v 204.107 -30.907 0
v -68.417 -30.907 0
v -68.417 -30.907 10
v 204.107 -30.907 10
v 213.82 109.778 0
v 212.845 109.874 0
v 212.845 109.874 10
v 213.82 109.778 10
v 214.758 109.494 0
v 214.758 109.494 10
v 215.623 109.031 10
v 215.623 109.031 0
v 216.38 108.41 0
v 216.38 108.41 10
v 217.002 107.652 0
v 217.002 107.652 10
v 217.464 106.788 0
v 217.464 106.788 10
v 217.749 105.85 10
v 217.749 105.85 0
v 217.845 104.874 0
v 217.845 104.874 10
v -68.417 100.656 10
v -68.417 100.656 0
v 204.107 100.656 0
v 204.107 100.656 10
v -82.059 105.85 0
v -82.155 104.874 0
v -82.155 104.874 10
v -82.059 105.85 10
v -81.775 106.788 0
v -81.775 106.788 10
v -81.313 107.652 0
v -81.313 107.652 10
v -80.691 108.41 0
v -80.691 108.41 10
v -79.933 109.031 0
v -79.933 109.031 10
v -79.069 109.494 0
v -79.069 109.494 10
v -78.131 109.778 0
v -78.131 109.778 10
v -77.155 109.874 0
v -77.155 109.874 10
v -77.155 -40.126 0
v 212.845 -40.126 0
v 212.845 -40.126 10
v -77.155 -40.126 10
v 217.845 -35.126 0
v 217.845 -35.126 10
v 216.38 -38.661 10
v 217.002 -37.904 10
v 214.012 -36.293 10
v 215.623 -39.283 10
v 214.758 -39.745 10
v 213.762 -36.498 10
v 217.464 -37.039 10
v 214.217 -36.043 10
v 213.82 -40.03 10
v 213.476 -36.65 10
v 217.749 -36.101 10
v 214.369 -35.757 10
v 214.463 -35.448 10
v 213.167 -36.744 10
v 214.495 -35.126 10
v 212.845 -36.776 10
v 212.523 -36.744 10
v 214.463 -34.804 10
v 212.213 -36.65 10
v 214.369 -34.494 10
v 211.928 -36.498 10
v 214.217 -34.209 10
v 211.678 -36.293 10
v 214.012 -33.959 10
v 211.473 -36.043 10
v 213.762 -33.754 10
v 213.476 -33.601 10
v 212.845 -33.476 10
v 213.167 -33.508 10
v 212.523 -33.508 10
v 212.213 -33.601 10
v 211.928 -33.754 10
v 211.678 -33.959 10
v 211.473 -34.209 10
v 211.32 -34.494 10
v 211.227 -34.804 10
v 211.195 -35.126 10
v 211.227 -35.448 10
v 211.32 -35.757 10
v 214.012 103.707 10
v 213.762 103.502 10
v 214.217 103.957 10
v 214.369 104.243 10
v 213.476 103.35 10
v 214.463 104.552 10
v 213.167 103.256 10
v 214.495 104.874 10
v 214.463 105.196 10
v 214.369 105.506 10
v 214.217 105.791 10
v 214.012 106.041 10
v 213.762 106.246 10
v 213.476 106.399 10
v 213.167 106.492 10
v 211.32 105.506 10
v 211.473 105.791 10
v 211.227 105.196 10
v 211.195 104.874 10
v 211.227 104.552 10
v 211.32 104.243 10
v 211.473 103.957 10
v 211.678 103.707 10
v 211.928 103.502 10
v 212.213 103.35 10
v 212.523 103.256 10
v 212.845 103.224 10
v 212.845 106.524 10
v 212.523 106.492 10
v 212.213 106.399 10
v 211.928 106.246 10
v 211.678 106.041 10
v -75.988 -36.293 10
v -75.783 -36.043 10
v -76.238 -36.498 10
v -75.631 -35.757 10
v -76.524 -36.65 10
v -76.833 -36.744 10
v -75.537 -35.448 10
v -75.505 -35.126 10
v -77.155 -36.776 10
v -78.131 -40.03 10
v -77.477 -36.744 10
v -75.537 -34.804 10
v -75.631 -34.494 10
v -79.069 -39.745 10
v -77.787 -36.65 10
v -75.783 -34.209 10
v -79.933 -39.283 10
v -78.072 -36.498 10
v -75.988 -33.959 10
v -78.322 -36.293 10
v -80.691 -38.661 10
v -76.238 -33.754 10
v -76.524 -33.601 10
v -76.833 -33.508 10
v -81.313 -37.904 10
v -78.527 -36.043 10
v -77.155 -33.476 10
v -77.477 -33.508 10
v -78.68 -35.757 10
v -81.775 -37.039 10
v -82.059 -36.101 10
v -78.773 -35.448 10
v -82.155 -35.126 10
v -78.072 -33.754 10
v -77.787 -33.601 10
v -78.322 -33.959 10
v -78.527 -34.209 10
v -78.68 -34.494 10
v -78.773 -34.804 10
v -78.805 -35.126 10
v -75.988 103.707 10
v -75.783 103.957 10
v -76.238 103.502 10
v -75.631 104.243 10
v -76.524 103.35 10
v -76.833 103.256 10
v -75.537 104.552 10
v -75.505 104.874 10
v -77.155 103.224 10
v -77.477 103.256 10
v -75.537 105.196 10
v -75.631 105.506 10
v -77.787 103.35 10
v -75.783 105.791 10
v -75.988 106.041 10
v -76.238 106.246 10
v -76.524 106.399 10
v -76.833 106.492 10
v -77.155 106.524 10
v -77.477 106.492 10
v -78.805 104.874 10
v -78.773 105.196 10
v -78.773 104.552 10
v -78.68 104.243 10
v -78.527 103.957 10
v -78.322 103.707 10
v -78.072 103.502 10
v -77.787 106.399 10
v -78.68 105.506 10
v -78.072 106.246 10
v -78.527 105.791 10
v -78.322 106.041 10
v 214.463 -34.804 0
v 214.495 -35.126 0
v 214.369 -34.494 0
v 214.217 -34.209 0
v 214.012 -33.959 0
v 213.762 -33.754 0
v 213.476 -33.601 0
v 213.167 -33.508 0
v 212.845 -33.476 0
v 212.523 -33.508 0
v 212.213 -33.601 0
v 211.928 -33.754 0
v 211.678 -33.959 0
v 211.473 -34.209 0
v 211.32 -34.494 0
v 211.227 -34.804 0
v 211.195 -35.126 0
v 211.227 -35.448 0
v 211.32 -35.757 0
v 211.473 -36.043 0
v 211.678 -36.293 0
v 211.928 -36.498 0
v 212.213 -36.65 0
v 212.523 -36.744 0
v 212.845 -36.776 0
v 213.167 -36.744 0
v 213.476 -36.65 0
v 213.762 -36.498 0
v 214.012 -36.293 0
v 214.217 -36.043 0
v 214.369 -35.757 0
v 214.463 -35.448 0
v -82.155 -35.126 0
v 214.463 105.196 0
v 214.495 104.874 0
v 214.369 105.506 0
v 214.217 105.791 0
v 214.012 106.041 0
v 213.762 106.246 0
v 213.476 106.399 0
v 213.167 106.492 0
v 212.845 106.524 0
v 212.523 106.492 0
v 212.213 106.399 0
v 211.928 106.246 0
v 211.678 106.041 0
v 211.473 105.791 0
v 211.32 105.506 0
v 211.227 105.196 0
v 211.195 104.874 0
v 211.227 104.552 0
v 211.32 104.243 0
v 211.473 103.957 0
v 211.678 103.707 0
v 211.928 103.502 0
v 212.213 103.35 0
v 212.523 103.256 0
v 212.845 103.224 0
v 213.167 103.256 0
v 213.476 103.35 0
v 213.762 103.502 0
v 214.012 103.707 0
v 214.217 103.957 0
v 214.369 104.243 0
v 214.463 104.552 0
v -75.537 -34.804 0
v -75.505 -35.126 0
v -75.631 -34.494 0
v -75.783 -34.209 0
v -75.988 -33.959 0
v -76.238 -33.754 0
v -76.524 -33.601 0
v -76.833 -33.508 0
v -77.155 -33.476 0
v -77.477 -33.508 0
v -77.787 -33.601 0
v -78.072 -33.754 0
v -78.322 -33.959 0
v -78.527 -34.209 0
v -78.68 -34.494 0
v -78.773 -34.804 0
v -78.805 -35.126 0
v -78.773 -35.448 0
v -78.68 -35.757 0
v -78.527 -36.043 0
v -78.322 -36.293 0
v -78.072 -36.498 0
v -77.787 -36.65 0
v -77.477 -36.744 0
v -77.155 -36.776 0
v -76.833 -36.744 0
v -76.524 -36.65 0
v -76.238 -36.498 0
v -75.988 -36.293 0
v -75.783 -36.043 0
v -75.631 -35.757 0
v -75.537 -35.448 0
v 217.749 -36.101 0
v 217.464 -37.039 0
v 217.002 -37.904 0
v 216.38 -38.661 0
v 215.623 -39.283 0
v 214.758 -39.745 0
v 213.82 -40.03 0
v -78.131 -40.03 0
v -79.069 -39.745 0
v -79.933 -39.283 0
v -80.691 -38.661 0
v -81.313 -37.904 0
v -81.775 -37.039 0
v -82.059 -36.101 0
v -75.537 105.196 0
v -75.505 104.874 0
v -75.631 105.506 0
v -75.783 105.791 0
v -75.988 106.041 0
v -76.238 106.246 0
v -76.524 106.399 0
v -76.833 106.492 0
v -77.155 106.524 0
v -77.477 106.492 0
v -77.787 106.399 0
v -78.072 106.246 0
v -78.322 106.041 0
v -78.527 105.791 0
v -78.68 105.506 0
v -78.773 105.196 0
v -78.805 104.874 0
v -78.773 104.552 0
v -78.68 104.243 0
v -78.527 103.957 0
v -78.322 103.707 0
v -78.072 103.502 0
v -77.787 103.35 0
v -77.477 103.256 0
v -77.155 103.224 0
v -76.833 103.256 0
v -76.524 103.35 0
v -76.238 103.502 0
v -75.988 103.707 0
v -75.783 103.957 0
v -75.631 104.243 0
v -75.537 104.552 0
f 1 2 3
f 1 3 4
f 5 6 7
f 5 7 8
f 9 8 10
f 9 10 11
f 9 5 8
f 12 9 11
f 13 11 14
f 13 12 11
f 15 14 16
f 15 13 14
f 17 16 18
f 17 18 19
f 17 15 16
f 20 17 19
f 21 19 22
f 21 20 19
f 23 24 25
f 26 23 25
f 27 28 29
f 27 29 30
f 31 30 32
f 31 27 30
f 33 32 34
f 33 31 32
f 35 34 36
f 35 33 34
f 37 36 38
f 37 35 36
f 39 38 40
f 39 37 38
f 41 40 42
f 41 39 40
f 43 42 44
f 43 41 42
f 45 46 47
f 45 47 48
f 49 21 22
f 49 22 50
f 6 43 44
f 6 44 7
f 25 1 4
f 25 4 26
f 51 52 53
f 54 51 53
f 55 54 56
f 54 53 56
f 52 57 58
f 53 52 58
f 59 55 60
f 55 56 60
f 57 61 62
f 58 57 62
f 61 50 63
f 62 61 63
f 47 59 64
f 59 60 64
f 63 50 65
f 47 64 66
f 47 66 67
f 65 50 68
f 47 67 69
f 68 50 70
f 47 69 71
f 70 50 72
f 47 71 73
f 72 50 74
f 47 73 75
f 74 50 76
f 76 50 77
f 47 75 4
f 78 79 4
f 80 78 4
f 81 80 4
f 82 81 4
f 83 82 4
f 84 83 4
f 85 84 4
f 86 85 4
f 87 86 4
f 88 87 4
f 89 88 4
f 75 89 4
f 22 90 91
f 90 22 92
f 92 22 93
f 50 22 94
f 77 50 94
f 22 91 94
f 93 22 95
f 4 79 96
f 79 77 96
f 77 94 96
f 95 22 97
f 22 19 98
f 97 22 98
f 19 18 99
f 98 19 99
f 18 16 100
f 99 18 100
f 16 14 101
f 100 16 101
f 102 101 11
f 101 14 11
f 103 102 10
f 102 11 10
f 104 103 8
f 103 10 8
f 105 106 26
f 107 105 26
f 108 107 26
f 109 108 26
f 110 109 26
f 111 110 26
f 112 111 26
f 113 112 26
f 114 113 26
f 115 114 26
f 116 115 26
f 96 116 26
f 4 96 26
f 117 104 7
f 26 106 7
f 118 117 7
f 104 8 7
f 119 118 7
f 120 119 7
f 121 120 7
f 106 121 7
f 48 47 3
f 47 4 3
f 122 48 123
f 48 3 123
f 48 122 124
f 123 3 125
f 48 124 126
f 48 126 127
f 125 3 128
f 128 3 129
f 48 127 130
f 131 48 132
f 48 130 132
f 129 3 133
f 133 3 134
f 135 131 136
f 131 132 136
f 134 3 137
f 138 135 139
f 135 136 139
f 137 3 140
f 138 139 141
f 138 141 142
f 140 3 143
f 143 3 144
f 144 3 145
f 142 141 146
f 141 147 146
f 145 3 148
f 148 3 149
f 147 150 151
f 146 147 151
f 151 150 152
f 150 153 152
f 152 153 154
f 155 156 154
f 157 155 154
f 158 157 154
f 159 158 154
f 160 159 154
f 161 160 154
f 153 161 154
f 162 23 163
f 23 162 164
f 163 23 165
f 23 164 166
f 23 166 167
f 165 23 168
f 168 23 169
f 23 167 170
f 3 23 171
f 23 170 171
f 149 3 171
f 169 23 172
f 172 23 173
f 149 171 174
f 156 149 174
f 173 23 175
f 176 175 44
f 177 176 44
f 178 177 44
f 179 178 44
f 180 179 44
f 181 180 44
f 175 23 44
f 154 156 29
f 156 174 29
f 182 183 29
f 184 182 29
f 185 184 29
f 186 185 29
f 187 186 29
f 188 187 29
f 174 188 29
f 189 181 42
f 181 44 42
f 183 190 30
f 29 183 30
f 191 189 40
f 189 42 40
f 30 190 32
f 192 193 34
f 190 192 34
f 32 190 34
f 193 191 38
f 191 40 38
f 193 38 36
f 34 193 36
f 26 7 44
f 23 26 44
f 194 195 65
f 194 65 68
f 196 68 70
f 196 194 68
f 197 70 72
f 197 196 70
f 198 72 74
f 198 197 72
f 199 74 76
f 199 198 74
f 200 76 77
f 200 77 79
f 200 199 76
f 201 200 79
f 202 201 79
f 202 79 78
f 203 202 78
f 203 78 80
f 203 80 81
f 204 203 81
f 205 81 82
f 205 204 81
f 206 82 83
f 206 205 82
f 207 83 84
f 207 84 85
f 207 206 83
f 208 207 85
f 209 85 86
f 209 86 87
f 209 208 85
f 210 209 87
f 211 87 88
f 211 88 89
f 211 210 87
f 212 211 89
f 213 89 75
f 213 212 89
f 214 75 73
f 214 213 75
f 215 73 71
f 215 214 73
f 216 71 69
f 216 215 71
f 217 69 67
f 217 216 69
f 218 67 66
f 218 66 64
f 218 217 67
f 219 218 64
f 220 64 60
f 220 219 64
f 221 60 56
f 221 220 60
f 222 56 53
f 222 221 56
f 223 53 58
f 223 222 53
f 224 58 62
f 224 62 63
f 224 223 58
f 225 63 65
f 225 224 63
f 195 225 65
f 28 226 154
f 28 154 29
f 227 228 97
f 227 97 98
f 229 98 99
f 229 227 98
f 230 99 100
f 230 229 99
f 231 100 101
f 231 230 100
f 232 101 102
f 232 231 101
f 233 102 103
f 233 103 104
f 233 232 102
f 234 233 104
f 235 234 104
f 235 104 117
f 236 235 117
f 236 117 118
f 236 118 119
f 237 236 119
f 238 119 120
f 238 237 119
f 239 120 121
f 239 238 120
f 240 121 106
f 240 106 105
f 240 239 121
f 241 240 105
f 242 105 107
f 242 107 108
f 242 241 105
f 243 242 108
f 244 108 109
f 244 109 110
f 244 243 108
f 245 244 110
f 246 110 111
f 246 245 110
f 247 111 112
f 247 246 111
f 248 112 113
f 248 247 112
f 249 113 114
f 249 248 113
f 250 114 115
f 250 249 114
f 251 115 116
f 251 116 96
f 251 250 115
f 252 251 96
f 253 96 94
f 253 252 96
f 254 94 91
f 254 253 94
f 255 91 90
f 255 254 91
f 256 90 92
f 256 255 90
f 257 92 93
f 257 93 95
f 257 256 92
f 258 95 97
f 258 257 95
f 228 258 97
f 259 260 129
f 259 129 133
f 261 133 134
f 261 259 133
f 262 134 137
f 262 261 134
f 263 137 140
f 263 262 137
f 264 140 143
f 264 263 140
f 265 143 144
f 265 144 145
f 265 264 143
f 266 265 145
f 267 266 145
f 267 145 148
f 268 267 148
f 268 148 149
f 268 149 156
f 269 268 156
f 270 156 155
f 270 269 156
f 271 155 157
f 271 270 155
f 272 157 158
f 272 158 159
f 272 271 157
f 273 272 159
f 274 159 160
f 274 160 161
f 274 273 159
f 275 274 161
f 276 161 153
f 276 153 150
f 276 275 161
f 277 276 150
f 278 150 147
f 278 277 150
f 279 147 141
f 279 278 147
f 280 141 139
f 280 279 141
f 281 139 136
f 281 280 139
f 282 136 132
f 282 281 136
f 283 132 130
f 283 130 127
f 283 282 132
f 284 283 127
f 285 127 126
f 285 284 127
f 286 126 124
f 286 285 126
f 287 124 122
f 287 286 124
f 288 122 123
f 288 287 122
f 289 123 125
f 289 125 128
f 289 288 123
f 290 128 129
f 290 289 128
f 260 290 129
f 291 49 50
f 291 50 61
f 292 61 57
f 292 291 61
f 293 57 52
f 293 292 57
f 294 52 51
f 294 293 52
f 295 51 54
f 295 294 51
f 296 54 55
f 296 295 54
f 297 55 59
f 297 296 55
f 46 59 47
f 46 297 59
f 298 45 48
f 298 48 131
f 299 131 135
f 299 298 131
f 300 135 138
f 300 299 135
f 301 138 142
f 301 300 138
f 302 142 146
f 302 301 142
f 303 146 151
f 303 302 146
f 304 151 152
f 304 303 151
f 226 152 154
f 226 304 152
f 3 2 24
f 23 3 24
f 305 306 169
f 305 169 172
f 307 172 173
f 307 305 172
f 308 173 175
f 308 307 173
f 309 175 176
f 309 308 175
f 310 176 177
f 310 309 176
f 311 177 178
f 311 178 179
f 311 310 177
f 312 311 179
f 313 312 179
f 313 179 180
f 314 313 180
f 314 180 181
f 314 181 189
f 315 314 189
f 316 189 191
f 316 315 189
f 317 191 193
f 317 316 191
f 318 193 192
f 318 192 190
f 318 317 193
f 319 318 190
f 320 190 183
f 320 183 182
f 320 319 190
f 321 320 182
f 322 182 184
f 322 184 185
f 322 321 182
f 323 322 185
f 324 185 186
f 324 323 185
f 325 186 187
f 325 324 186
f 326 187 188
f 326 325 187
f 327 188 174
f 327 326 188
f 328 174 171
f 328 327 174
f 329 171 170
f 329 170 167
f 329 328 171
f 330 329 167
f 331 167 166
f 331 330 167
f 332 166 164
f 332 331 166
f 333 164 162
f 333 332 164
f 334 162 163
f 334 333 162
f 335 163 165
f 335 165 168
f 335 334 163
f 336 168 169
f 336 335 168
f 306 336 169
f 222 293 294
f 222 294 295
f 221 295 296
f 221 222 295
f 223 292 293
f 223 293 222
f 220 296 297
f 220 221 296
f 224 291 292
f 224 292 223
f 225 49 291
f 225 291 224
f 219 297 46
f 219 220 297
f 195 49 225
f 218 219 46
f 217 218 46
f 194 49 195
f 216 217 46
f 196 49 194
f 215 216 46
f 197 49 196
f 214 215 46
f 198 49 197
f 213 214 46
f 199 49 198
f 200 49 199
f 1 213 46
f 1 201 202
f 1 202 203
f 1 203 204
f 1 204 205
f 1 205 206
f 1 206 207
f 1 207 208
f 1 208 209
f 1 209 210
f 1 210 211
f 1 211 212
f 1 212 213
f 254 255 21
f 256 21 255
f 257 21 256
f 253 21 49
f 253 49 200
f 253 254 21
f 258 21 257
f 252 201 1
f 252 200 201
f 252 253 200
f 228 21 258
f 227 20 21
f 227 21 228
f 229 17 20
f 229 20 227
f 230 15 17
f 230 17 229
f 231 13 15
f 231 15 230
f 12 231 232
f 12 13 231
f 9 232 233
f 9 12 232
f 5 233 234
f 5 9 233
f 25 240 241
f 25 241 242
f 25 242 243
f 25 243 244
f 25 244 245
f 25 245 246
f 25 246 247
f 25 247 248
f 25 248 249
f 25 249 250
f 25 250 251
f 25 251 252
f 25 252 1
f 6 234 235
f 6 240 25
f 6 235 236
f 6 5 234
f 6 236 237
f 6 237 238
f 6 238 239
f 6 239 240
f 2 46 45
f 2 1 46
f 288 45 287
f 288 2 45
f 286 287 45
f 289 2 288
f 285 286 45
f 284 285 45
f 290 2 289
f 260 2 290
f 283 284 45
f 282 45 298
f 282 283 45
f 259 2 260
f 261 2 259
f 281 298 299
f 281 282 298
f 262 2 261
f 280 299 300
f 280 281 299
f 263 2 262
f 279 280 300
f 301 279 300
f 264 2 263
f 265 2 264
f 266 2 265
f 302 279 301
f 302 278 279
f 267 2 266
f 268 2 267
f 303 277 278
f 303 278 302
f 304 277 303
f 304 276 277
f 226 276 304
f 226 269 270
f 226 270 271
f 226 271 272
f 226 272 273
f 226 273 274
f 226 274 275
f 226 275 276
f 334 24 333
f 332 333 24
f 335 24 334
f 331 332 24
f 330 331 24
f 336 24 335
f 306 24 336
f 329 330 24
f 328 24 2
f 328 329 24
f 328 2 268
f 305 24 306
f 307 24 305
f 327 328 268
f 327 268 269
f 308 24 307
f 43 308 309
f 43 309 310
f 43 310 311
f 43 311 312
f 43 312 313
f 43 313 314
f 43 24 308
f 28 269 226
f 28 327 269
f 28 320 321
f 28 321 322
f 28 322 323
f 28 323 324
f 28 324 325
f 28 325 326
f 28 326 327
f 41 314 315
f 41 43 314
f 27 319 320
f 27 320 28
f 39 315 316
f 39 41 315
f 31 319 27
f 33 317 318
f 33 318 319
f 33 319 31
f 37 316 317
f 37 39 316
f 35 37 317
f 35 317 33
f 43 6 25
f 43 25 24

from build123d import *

# Parameters (mm, degrees)
SKETCH_1_R      = 1.65
SKETCH_1_W      = 272.523786307
SKETCH_1_H      = 131.563207183
EXTRUDE_4_DEPTH = 10


with BuildPart() as part:
    # 草图1 → 凸台-拉伸4 (new body)
    with BuildSketch(Plane.XY):
        with BuildLine():
            Line((-77.155190134, 109.874140248), (212.844809866, 109.874140248))
            ThreePointArc((212.844809866, 109.874140248), (216.380343772, 108.409674154), (217.844809866, 104.874140248))
            Line((217.844809866, 104.874140248), (217.844809866, -35.125859752))
            ThreePointArc((217.844809866, -35.125859752), (216.380343772, -38.661393658), (212.844809866, -40.125859752))
            Line((212.844809866, -40.125859752), (-77.155190134, -40.125859752))
            ThreePointArc((-77.155190134, -40.125859752), (-80.69072404, -38.661393658), (-82.155190134, -35.125859752))
            Line((-82.155190134, -35.125859752), (-82.155190134, 104.874140248))
            ThreePointArc((-82.155190134, 104.874140248), (-80.69072404, 108.409674154), (-77.155190134, 109.874140248))
        make_face()
        with Locations((-77.155190134, 104.874140248)):
            Circle(SKETCH_1_R, mode=Mode.SUBTRACT)
        with Locations((212.844809866, -35.125859752)):
            Circle(SKETCH_1_R, mode=Mode.SUBTRACT)
        with Locations((-77.155190134, -35.125859752)):
            Circle(SKETCH_1_R, mode=Mode.SUBTRACT)
        with Locations((212.844809866, 104.874140248)):
            Circle(SKETCH_1_R, mode=Mode.SUBTRACT)
        with Locations((67.844809867, 34.874140248)):
            Rectangle(SKETCH_1_W, SKETCH_1_H, mode=Mode.SUBTRACT)
    extrude(amount=EXTRUDE_4_DEPTH)


solid = part.part
